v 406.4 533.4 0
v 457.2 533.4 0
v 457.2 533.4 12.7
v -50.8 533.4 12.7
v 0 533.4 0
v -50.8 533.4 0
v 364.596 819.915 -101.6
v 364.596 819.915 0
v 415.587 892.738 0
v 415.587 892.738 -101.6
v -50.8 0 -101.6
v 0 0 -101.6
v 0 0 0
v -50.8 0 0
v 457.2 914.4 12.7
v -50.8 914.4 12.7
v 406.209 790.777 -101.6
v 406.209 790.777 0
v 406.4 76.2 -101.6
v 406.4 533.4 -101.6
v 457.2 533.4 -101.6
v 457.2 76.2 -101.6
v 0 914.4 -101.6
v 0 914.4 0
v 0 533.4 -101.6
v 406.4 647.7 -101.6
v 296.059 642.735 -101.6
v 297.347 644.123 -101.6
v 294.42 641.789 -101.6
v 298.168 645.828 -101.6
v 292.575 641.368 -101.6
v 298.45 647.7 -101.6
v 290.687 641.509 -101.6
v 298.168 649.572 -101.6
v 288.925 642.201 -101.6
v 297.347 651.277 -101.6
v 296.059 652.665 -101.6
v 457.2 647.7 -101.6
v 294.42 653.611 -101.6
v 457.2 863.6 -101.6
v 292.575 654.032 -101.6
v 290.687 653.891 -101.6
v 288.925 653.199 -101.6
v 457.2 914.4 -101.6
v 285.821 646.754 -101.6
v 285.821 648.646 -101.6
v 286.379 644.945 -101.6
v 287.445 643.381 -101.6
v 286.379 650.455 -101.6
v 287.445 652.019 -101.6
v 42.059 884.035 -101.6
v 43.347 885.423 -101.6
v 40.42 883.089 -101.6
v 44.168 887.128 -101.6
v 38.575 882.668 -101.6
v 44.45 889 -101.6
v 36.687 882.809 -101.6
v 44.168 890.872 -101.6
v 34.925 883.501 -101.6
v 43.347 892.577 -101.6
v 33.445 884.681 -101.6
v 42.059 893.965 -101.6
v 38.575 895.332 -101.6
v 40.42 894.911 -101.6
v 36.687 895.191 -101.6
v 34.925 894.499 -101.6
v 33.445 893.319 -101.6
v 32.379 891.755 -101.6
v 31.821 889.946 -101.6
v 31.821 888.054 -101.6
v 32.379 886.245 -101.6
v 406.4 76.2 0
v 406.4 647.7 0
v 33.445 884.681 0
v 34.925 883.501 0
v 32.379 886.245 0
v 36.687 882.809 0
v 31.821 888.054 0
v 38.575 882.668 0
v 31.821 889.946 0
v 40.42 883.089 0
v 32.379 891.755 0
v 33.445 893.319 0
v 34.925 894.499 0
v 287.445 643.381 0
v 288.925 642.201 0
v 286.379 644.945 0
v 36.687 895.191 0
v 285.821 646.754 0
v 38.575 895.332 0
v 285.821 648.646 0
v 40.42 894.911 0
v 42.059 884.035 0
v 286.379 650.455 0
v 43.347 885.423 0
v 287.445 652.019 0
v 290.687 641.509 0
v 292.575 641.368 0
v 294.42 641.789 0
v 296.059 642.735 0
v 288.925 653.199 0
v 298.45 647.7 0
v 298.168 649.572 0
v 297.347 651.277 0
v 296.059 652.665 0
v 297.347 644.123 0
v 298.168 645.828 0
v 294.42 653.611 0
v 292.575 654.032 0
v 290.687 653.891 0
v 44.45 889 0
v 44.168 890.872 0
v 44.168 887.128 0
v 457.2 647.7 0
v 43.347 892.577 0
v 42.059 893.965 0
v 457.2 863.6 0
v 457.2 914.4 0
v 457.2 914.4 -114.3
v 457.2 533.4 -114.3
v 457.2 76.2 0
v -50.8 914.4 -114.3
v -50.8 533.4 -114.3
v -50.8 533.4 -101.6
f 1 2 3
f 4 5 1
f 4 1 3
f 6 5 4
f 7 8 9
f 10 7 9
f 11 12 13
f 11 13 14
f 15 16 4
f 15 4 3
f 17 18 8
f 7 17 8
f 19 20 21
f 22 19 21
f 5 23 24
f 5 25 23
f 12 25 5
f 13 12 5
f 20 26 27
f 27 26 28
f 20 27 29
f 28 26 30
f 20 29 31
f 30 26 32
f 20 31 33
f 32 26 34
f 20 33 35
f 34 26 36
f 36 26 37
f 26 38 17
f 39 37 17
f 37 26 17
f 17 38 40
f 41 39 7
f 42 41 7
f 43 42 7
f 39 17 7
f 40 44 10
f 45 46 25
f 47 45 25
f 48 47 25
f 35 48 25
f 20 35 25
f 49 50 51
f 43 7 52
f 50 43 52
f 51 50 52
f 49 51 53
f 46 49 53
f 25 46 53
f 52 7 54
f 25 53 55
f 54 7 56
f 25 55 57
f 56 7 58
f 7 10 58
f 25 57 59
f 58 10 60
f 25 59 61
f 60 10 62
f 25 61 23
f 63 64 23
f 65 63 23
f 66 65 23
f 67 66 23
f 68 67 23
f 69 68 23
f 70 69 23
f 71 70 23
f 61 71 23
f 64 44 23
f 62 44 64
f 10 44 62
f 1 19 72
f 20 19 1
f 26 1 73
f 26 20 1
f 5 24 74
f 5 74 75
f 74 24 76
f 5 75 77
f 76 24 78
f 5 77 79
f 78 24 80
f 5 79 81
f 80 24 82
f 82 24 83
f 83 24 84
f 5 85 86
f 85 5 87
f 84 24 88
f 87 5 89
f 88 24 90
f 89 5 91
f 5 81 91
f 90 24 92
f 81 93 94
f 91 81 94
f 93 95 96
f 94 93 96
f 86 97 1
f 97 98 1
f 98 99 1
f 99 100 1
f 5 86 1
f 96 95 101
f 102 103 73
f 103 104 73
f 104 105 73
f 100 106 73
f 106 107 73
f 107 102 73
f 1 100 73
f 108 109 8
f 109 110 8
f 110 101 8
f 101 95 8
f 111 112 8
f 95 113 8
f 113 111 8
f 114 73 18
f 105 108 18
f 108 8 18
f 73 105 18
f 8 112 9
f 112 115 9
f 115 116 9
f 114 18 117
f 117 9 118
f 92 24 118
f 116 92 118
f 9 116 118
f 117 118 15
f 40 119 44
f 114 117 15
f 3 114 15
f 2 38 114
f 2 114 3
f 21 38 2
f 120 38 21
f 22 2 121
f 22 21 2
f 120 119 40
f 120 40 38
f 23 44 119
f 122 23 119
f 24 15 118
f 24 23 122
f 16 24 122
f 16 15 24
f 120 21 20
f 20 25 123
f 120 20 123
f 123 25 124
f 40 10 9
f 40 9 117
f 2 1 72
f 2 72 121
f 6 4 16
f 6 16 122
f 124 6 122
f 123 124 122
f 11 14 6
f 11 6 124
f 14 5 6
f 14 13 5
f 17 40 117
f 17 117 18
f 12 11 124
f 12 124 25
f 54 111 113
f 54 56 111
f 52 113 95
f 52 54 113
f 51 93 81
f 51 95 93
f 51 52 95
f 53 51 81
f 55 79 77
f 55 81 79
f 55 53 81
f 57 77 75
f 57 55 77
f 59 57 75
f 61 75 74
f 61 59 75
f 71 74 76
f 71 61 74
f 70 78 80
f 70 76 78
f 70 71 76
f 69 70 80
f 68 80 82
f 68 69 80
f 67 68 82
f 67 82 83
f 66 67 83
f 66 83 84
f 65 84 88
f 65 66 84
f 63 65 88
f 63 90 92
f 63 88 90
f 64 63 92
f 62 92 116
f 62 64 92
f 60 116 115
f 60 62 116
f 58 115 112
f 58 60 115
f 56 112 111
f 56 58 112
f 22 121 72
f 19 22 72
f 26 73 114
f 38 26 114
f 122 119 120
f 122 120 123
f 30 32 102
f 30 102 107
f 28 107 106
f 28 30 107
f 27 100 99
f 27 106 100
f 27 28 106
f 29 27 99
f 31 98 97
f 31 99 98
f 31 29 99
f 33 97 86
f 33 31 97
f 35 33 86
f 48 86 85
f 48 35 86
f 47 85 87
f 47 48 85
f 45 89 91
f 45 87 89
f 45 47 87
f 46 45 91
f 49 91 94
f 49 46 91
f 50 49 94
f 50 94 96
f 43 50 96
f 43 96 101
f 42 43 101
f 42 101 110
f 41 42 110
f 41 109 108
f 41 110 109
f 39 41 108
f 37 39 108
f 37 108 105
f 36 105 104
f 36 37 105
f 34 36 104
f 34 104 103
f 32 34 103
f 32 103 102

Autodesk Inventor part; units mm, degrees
ref_plane "YZ Plane" through (0, 0, 0) normal (1, 0, 0) x (0, 1, 0)
ref_plane "XZ Plane" through (0, 0, 0) normal (0, 1, 0) x (-1, 0, 0)
ref_plane "XY Plane" through (0, 0, 0) normal (0, 0, 1) x (1, 0, 0)
sketch "Sketch1" plane through (0, 0, 0) normal (0, 1, 0) x (-1, 0, 0)
  line L0 (0, 0) -> (50.8, 0)
  line L1 (50.8, 0) -> (50.8, -101.6)
  line L2 (50.8, -101.6) -> (0, -101.6)
  line L3 (0, -101.6) -> (0, 0)
  dimension "d0" = 50.8
  dimension "d1" = 101.6
extrude "Extrusion1" add sketch "Sketch1" along normal blind 914.4
sketch "Sketch2" plane through (-50.8, 0, 0) normal (0, 0, 1) x (1, 0, 0)
  line L0 (0, 0) -> (0, 914.4) projected
  line L1 (0, 914.4) -> (508, 914.4)
  line L2 (508, 914.4) -> (508, 533.4)
  line L3 (508, 533.4) -> (0, 533.4)
  line L4 (0, 533.4) -> (0, 914.4)
  point P0 (50.8, 0)
  dimension "d4" = 508
  dimension "d5" = 381
extrude "Extrusion2" add sketch "Sketch2" along normal blind 12.7
sketch "Sketch3" plane through (0, 0, -101.6) normal (0, 0, -1) x (-1, 0, 0)
  line L0 (0, 533.4) -> (0, 914.4) projected
  line L1 (0, 914.4) -> (-457.2, 914.4) projected
  line L2 (-457.2, 914.4) -> (-457.2, 533.4) projected
  line L3 (-457.2, 533.4) -> (0, 533.4) projected
  line L4 (-457.2, 914.4) -> (50.8, 914.4) projected
  line L5 (50.8, 914.4) -> (50.8, 533.4) projected
  line L6 (50.8, 533.4) -> (-457.2, 533.4) projected
  line L7 (-457.2, 533.4) -> (-457.2, 914.4) projected
  point P0 (0, 0)
extrude "Extrusion3" add sketch "Sketch3" along normal blind 12.7
sketch "Sketch4" plane through (0, 0, -101.6) normal (0, 0, 1) x (1, 0, 0)
  line L0 (457.2, 533.4) -> (0, 533.4) projected
  line L1 (457.2, 533.4) -> (406.4, 533.4)
  line L2 (406.4, 533.4) -> (406.4, 647.7)
  line L3 (406.4, 647.7) -> (457.2, 647.7)
  line L4 (457.2, 647.7) -> (457.2, 533.4)
  line L5 (406.4, 647.7) -> (457.2, 647.7)
  line L6 (457.2, 647.7) -> (457.2, 76.2)
  line L7 (457.2, 76.2) -> (406.4, 76.2)
  line L8 (406.4, 76.2) -> (406.4, 647.7)
  line L9 (457.2, 914.4) -> (-50.8, 914.4) projected
  point P0 (0, 0)
  dimension "d10" = 50.8
  dimension "d11" = 114.3
  dimension "d12" = 838.2
extrude "Extrusion4" add sketch "Sketch4" along normal up to surface (101.6 mm away)
sketch "Sketch5" plane through (0, 0, -101.6) normal (0, 0, 1) x (1, 0, 0)
  circle A0 centre (38.1, 889) radius 6.35
  circle A1 centre (292.1, 647.7) radius 6.35
  line L0 (-50.8, 914.4) -> (-50.8, 533.4) projected
  line L1 (457.2, 914.4) -> (-50.8, 914.4) projected
  line L2 (457.2, 533.4) -> (457.2, 914.4) projected
  line L3 (-50.8, 533.4) -> (457.2, 533.4) projected
  point P0 (0, 0)
  dimension "d15" = 12.7
  dimension "d16" = 12.7
  dimension "d17" = 88.9
  dimension "d18" = 25.4
  dimension "d20" = 165.1
  dimension "d21" = 114.3
extrude "Extrusion5" add sketch "Sketch5" along normal up to surface (101.6 mm away) contours A0 | A1
sketch "Sketch6" plane through (0, 0, -101.6) normal (0, 0, 1) x (1, 0, 0)
  line L0 (457.2, 914.4) -> (457.2, 647.7) projected
  line L1 (457.2, 863.6) -> (406.2091, 790.7774)
  line L2 (457.2, 863.6) -> (546.1, 863.6) construction
  line L3 (406.2091, 790.7774) -> (364.5961, 819.9151)
  line L4 (364.5961, 819.9151) -> (415.5871, 892.7377)
  line L5 (415.5871, 892.7377) -> (457.2, 863.6)
  line L6 (457.2, 914.4) -> (0, 914.4) projected
  point P0 (0, 0)
  dimension "d24" = 88.9
  dimension "d25" = 125
  dimension "d26" = 50.8
  dimension "d27" = 50.8
extrude "Extrusion6" add sketch "Sketch6" along normal up to surface (101.6 mm away)
properties part number "PBotCatapultShell"
